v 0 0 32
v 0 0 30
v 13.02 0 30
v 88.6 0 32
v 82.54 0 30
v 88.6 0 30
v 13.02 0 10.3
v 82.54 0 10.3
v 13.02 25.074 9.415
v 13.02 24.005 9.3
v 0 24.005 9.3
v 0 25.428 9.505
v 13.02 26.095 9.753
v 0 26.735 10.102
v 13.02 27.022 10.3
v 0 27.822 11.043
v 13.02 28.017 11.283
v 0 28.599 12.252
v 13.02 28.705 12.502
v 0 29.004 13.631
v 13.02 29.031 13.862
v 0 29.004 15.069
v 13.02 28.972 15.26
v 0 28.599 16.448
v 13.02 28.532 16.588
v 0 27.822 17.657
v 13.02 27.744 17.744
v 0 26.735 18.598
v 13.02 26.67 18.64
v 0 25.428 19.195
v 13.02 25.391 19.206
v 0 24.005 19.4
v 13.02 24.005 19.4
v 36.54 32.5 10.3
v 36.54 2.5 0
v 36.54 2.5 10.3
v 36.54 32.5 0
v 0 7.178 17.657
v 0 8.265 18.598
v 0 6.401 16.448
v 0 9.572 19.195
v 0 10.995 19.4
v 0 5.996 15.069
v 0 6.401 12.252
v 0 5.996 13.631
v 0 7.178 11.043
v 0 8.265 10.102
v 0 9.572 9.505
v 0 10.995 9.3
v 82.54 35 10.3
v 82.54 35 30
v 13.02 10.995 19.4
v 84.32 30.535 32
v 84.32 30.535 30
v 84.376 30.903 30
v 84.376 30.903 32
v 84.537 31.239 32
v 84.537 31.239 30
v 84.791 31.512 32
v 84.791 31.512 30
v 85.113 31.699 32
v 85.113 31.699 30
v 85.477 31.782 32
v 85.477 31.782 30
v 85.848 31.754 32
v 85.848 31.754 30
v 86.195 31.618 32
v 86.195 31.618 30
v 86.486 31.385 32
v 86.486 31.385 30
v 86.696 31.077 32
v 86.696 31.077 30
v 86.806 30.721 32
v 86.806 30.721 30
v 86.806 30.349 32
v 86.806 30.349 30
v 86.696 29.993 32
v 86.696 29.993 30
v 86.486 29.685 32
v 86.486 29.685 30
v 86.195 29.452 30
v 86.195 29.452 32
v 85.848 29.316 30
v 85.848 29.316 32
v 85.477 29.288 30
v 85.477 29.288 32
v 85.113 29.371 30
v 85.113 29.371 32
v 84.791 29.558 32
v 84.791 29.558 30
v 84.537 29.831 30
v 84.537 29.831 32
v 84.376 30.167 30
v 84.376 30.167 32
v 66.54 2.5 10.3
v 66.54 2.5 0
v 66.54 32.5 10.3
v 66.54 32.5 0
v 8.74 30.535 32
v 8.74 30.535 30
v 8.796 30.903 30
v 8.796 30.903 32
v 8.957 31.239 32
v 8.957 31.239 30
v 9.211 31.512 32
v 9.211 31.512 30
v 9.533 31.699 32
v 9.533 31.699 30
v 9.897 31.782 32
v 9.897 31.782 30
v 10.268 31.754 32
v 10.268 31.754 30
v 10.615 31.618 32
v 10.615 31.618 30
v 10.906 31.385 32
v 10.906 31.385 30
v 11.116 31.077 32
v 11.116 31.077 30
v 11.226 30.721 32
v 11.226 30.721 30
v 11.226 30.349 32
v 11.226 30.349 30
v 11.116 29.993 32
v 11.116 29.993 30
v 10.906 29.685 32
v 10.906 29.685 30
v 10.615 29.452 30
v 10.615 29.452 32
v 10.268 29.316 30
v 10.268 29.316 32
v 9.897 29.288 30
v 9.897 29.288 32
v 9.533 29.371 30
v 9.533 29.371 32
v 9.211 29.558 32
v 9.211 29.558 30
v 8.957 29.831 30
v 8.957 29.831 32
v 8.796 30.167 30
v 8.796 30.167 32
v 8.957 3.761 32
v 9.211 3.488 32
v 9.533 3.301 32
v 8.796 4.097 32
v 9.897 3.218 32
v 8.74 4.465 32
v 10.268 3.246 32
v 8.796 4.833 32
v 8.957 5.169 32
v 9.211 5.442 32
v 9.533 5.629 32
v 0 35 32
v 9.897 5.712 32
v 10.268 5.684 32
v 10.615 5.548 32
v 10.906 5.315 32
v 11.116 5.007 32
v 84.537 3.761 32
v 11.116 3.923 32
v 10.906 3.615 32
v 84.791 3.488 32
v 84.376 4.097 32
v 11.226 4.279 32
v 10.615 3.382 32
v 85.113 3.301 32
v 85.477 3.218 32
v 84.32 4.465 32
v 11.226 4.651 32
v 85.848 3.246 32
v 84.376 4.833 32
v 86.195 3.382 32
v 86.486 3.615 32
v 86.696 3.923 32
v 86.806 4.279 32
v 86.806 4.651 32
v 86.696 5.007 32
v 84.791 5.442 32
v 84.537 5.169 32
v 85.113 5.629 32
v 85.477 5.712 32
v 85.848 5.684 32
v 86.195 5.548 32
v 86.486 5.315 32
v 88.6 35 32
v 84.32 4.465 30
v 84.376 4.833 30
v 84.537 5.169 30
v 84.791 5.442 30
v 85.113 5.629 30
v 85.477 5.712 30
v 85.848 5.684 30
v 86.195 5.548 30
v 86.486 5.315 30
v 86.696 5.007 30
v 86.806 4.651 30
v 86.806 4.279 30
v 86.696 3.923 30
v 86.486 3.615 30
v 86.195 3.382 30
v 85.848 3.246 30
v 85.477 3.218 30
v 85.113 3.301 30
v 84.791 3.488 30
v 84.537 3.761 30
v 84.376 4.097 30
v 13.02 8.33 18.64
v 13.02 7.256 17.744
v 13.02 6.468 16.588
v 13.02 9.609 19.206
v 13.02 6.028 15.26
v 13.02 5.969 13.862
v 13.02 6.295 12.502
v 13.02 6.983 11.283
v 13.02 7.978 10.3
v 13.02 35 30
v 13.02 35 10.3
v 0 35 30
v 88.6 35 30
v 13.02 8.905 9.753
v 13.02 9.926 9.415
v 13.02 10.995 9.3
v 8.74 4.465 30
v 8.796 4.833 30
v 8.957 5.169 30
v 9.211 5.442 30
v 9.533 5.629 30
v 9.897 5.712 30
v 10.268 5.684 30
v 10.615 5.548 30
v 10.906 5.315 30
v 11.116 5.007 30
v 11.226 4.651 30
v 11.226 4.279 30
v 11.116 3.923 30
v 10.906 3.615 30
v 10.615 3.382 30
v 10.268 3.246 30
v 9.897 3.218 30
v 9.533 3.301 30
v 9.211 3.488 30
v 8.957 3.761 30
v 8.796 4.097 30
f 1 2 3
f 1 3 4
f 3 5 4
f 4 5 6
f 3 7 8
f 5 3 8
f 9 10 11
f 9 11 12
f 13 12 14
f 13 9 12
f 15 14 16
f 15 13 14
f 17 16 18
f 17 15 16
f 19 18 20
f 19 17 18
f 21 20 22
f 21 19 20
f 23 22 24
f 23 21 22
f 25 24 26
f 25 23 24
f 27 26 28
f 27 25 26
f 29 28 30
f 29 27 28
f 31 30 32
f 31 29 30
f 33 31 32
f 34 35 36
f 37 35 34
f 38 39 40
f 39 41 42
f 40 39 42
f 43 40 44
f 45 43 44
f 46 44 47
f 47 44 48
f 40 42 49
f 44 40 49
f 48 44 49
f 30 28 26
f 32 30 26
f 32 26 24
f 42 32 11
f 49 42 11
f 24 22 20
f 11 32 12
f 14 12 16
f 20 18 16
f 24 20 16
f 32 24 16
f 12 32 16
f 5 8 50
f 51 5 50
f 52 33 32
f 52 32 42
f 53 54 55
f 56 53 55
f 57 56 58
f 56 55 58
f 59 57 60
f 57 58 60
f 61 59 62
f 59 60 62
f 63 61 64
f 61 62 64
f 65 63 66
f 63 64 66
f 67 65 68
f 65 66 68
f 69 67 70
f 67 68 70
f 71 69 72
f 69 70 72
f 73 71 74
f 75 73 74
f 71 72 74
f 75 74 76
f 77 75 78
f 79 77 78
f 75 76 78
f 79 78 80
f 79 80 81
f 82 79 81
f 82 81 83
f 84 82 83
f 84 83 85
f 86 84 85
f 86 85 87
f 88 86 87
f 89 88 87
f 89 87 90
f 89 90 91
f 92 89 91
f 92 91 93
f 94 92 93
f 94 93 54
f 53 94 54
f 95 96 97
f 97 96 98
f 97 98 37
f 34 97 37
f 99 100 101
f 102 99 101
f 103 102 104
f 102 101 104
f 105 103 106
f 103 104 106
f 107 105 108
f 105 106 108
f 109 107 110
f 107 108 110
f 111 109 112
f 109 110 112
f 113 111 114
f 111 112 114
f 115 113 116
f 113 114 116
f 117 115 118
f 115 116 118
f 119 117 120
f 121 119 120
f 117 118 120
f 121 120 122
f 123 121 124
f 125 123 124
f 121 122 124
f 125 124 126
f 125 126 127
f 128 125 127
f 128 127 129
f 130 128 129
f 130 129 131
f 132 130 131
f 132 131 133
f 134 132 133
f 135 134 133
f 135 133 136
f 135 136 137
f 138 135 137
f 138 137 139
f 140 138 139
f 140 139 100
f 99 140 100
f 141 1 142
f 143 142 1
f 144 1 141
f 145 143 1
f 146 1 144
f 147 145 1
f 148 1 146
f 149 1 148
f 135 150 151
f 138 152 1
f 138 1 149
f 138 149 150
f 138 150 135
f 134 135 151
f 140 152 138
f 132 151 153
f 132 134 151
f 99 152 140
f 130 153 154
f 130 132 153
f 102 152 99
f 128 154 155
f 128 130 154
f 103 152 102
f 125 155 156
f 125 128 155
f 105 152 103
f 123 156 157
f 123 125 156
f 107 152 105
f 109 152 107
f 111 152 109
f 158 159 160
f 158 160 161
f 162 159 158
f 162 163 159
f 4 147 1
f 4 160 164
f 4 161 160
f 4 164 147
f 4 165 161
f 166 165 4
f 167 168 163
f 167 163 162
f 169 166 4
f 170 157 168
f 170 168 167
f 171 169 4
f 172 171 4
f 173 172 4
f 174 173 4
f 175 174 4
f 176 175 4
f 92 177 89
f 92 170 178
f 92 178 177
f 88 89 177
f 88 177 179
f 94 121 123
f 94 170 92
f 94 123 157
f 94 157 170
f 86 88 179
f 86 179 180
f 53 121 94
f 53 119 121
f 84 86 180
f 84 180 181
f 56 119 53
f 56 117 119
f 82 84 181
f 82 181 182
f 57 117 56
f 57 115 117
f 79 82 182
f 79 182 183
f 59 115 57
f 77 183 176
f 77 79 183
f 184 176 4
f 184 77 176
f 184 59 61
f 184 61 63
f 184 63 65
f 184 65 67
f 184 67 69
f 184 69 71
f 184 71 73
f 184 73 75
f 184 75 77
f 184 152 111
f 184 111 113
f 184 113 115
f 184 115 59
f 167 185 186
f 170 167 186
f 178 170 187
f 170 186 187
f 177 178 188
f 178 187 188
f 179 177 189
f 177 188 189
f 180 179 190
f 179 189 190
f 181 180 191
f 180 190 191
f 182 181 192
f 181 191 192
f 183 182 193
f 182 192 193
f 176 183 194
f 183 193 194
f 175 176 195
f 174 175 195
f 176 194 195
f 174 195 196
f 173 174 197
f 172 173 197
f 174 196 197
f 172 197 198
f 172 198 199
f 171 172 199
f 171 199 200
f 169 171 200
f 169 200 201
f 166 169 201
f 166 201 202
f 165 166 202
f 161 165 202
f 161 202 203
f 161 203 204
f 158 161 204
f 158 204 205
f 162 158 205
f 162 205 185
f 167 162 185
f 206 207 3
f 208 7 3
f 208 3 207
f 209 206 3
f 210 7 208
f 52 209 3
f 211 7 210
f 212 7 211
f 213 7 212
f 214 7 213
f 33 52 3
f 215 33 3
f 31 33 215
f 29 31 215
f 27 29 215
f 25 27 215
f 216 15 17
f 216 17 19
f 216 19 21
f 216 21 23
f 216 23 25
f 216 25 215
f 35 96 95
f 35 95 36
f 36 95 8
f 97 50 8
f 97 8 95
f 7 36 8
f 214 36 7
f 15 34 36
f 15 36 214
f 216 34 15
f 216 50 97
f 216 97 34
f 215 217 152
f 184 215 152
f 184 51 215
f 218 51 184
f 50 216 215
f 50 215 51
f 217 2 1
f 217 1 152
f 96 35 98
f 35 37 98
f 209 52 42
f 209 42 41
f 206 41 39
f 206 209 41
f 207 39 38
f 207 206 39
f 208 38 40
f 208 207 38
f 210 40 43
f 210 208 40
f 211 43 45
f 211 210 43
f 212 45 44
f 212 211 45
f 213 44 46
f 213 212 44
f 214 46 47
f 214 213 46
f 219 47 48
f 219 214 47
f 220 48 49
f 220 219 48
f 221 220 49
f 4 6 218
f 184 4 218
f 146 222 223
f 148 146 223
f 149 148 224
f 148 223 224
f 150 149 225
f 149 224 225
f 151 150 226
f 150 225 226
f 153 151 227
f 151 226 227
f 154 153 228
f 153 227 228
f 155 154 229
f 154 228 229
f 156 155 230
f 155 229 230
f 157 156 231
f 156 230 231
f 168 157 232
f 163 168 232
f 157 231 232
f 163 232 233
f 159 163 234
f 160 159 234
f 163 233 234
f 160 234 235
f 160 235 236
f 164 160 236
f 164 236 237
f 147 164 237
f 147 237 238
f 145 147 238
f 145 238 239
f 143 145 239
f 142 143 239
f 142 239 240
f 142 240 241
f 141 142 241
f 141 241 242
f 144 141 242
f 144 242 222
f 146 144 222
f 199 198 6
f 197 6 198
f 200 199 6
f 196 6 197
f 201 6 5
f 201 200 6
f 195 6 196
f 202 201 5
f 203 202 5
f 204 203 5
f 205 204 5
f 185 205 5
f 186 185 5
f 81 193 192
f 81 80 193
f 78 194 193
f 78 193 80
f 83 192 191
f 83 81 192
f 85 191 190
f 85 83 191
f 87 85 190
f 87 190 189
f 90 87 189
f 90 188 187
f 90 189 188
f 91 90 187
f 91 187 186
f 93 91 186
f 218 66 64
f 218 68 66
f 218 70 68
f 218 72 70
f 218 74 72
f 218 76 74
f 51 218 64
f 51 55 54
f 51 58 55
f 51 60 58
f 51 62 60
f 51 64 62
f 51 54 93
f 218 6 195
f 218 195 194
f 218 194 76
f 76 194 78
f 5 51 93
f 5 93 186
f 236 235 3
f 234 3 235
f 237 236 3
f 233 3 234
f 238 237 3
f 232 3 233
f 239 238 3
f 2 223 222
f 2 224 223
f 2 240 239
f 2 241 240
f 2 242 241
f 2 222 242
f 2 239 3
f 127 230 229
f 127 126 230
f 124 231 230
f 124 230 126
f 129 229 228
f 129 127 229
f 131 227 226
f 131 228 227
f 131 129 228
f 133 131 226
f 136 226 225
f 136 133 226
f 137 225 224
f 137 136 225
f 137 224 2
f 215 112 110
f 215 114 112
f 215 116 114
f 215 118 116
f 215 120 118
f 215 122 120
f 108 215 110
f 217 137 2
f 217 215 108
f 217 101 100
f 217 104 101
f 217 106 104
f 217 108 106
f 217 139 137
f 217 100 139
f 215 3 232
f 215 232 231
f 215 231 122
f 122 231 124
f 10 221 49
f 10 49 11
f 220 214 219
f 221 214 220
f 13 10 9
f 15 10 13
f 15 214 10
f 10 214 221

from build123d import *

# Parameters (mm, degrees)
SKETCH1_W                   = 88.6
SKETCH1_H                   = 35
BOSS_EXTRUDE1_DEPTH         = 32
TAP_DRILL_FOR_M3X0_5_TAP1_D = 2.5
SKETCH4_W                   = 6.06
SKETCH4_H                   = 35
SKETCH4_W_2                 = 13.02
CUT_EXTRUDE2_DEPTH          = 30
SKETCH5_OUTSIDE_W           = 110.698
SKETCH5_OUTSIDE_H           = 57.098
SKETCH5_OUTSIDE_W_2         = 30
SKETCH5_OUTSIDE_H_2         = 30
CUT_EXTRUDE3_DEPTH          = 10.3
BOSS_EXTRUDE2_DEPTH         = 13.02


with BuildPart() as part:
    # Sketch1 → Boss-Extrude1 (new body)
    with BuildSketch(Plane.XY):
        with Locations((44.3, 17.5)):
            Rectangle(SKETCH1_W, SKETCH1_H)
    extrude(amount=BOSS_EXTRUDE1_DEPTH)

    # Tap Drill for M3x0.5 Tap1 (through all)
    with Locations(Plane.XY.offset(32)):
        with Locations((9.99, 30.535), (9.99, 4.465), (85.57, 4.465), (85.57, 30.535)):
            Hole(TAP_DRILL_FOR_M3X0_5_TAP1_D / 2)

    # Sketch4 → Cut-Extrude2 (cut)
    with BuildSketch(Plane(origin=(0, 0, 0), x_dir=(-1, 0, 0), z_dir=(0, 0, -1))):
        with Locations((-85.57, 17.5)):
            Rectangle(SKETCH4_W, SKETCH4_H)
        with Locations((-6.51, 17.5)):
            Rectangle(SKETCH4_W_2, SKETCH4_H)
    extrude(amount=-CUT_EXTRUDE2_DEPTH, mode=Mode.SUBTRACT)

    # Sketch5 outside → Cut-Extrude3 (cut)
    with BuildSketch(Plane(origin=(0, 0, 0), x_dir=(-1, 0, 0), z_dir=(0, 0, -1))):
        with Locations((-44.3, 17.5)):
            Rectangle(SKETCH5_OUTSIDE_W, SKETCH5_OUTSIDE_H)
        with Locations((-51.54, 17.5)):
            Rectangle(SKETCH5_OUTSIDE_W_2, SKETCH5_OUTSIDE_H_2, mode=Mode.SUBTRACT)
    extrude(amount=-CUT_EXTRUDE3_DEPTH, mode=Mode.SUBTRACT)

    # Sketch6 → Boss-Extrude2 (add)
    with BuildSketch(Plane.ZY.offset(-13.02)):
        with BuildLine():
            Line((19.4, 24.005), (19.4, 10.995))
            ThreePointArc((19.4, 10.995), (14.35, 5.945), (9.3, 10.995))
            Line((9.3, 10.995), (9.3, 24.005))
            ThreePointArc((9.3, 24.005), (14.35, 29.055), (19.4, 24.005))
        make_face()
    extrude(amount=BOSS_EXTRUDE2_DEPTH)


solid = part.part
